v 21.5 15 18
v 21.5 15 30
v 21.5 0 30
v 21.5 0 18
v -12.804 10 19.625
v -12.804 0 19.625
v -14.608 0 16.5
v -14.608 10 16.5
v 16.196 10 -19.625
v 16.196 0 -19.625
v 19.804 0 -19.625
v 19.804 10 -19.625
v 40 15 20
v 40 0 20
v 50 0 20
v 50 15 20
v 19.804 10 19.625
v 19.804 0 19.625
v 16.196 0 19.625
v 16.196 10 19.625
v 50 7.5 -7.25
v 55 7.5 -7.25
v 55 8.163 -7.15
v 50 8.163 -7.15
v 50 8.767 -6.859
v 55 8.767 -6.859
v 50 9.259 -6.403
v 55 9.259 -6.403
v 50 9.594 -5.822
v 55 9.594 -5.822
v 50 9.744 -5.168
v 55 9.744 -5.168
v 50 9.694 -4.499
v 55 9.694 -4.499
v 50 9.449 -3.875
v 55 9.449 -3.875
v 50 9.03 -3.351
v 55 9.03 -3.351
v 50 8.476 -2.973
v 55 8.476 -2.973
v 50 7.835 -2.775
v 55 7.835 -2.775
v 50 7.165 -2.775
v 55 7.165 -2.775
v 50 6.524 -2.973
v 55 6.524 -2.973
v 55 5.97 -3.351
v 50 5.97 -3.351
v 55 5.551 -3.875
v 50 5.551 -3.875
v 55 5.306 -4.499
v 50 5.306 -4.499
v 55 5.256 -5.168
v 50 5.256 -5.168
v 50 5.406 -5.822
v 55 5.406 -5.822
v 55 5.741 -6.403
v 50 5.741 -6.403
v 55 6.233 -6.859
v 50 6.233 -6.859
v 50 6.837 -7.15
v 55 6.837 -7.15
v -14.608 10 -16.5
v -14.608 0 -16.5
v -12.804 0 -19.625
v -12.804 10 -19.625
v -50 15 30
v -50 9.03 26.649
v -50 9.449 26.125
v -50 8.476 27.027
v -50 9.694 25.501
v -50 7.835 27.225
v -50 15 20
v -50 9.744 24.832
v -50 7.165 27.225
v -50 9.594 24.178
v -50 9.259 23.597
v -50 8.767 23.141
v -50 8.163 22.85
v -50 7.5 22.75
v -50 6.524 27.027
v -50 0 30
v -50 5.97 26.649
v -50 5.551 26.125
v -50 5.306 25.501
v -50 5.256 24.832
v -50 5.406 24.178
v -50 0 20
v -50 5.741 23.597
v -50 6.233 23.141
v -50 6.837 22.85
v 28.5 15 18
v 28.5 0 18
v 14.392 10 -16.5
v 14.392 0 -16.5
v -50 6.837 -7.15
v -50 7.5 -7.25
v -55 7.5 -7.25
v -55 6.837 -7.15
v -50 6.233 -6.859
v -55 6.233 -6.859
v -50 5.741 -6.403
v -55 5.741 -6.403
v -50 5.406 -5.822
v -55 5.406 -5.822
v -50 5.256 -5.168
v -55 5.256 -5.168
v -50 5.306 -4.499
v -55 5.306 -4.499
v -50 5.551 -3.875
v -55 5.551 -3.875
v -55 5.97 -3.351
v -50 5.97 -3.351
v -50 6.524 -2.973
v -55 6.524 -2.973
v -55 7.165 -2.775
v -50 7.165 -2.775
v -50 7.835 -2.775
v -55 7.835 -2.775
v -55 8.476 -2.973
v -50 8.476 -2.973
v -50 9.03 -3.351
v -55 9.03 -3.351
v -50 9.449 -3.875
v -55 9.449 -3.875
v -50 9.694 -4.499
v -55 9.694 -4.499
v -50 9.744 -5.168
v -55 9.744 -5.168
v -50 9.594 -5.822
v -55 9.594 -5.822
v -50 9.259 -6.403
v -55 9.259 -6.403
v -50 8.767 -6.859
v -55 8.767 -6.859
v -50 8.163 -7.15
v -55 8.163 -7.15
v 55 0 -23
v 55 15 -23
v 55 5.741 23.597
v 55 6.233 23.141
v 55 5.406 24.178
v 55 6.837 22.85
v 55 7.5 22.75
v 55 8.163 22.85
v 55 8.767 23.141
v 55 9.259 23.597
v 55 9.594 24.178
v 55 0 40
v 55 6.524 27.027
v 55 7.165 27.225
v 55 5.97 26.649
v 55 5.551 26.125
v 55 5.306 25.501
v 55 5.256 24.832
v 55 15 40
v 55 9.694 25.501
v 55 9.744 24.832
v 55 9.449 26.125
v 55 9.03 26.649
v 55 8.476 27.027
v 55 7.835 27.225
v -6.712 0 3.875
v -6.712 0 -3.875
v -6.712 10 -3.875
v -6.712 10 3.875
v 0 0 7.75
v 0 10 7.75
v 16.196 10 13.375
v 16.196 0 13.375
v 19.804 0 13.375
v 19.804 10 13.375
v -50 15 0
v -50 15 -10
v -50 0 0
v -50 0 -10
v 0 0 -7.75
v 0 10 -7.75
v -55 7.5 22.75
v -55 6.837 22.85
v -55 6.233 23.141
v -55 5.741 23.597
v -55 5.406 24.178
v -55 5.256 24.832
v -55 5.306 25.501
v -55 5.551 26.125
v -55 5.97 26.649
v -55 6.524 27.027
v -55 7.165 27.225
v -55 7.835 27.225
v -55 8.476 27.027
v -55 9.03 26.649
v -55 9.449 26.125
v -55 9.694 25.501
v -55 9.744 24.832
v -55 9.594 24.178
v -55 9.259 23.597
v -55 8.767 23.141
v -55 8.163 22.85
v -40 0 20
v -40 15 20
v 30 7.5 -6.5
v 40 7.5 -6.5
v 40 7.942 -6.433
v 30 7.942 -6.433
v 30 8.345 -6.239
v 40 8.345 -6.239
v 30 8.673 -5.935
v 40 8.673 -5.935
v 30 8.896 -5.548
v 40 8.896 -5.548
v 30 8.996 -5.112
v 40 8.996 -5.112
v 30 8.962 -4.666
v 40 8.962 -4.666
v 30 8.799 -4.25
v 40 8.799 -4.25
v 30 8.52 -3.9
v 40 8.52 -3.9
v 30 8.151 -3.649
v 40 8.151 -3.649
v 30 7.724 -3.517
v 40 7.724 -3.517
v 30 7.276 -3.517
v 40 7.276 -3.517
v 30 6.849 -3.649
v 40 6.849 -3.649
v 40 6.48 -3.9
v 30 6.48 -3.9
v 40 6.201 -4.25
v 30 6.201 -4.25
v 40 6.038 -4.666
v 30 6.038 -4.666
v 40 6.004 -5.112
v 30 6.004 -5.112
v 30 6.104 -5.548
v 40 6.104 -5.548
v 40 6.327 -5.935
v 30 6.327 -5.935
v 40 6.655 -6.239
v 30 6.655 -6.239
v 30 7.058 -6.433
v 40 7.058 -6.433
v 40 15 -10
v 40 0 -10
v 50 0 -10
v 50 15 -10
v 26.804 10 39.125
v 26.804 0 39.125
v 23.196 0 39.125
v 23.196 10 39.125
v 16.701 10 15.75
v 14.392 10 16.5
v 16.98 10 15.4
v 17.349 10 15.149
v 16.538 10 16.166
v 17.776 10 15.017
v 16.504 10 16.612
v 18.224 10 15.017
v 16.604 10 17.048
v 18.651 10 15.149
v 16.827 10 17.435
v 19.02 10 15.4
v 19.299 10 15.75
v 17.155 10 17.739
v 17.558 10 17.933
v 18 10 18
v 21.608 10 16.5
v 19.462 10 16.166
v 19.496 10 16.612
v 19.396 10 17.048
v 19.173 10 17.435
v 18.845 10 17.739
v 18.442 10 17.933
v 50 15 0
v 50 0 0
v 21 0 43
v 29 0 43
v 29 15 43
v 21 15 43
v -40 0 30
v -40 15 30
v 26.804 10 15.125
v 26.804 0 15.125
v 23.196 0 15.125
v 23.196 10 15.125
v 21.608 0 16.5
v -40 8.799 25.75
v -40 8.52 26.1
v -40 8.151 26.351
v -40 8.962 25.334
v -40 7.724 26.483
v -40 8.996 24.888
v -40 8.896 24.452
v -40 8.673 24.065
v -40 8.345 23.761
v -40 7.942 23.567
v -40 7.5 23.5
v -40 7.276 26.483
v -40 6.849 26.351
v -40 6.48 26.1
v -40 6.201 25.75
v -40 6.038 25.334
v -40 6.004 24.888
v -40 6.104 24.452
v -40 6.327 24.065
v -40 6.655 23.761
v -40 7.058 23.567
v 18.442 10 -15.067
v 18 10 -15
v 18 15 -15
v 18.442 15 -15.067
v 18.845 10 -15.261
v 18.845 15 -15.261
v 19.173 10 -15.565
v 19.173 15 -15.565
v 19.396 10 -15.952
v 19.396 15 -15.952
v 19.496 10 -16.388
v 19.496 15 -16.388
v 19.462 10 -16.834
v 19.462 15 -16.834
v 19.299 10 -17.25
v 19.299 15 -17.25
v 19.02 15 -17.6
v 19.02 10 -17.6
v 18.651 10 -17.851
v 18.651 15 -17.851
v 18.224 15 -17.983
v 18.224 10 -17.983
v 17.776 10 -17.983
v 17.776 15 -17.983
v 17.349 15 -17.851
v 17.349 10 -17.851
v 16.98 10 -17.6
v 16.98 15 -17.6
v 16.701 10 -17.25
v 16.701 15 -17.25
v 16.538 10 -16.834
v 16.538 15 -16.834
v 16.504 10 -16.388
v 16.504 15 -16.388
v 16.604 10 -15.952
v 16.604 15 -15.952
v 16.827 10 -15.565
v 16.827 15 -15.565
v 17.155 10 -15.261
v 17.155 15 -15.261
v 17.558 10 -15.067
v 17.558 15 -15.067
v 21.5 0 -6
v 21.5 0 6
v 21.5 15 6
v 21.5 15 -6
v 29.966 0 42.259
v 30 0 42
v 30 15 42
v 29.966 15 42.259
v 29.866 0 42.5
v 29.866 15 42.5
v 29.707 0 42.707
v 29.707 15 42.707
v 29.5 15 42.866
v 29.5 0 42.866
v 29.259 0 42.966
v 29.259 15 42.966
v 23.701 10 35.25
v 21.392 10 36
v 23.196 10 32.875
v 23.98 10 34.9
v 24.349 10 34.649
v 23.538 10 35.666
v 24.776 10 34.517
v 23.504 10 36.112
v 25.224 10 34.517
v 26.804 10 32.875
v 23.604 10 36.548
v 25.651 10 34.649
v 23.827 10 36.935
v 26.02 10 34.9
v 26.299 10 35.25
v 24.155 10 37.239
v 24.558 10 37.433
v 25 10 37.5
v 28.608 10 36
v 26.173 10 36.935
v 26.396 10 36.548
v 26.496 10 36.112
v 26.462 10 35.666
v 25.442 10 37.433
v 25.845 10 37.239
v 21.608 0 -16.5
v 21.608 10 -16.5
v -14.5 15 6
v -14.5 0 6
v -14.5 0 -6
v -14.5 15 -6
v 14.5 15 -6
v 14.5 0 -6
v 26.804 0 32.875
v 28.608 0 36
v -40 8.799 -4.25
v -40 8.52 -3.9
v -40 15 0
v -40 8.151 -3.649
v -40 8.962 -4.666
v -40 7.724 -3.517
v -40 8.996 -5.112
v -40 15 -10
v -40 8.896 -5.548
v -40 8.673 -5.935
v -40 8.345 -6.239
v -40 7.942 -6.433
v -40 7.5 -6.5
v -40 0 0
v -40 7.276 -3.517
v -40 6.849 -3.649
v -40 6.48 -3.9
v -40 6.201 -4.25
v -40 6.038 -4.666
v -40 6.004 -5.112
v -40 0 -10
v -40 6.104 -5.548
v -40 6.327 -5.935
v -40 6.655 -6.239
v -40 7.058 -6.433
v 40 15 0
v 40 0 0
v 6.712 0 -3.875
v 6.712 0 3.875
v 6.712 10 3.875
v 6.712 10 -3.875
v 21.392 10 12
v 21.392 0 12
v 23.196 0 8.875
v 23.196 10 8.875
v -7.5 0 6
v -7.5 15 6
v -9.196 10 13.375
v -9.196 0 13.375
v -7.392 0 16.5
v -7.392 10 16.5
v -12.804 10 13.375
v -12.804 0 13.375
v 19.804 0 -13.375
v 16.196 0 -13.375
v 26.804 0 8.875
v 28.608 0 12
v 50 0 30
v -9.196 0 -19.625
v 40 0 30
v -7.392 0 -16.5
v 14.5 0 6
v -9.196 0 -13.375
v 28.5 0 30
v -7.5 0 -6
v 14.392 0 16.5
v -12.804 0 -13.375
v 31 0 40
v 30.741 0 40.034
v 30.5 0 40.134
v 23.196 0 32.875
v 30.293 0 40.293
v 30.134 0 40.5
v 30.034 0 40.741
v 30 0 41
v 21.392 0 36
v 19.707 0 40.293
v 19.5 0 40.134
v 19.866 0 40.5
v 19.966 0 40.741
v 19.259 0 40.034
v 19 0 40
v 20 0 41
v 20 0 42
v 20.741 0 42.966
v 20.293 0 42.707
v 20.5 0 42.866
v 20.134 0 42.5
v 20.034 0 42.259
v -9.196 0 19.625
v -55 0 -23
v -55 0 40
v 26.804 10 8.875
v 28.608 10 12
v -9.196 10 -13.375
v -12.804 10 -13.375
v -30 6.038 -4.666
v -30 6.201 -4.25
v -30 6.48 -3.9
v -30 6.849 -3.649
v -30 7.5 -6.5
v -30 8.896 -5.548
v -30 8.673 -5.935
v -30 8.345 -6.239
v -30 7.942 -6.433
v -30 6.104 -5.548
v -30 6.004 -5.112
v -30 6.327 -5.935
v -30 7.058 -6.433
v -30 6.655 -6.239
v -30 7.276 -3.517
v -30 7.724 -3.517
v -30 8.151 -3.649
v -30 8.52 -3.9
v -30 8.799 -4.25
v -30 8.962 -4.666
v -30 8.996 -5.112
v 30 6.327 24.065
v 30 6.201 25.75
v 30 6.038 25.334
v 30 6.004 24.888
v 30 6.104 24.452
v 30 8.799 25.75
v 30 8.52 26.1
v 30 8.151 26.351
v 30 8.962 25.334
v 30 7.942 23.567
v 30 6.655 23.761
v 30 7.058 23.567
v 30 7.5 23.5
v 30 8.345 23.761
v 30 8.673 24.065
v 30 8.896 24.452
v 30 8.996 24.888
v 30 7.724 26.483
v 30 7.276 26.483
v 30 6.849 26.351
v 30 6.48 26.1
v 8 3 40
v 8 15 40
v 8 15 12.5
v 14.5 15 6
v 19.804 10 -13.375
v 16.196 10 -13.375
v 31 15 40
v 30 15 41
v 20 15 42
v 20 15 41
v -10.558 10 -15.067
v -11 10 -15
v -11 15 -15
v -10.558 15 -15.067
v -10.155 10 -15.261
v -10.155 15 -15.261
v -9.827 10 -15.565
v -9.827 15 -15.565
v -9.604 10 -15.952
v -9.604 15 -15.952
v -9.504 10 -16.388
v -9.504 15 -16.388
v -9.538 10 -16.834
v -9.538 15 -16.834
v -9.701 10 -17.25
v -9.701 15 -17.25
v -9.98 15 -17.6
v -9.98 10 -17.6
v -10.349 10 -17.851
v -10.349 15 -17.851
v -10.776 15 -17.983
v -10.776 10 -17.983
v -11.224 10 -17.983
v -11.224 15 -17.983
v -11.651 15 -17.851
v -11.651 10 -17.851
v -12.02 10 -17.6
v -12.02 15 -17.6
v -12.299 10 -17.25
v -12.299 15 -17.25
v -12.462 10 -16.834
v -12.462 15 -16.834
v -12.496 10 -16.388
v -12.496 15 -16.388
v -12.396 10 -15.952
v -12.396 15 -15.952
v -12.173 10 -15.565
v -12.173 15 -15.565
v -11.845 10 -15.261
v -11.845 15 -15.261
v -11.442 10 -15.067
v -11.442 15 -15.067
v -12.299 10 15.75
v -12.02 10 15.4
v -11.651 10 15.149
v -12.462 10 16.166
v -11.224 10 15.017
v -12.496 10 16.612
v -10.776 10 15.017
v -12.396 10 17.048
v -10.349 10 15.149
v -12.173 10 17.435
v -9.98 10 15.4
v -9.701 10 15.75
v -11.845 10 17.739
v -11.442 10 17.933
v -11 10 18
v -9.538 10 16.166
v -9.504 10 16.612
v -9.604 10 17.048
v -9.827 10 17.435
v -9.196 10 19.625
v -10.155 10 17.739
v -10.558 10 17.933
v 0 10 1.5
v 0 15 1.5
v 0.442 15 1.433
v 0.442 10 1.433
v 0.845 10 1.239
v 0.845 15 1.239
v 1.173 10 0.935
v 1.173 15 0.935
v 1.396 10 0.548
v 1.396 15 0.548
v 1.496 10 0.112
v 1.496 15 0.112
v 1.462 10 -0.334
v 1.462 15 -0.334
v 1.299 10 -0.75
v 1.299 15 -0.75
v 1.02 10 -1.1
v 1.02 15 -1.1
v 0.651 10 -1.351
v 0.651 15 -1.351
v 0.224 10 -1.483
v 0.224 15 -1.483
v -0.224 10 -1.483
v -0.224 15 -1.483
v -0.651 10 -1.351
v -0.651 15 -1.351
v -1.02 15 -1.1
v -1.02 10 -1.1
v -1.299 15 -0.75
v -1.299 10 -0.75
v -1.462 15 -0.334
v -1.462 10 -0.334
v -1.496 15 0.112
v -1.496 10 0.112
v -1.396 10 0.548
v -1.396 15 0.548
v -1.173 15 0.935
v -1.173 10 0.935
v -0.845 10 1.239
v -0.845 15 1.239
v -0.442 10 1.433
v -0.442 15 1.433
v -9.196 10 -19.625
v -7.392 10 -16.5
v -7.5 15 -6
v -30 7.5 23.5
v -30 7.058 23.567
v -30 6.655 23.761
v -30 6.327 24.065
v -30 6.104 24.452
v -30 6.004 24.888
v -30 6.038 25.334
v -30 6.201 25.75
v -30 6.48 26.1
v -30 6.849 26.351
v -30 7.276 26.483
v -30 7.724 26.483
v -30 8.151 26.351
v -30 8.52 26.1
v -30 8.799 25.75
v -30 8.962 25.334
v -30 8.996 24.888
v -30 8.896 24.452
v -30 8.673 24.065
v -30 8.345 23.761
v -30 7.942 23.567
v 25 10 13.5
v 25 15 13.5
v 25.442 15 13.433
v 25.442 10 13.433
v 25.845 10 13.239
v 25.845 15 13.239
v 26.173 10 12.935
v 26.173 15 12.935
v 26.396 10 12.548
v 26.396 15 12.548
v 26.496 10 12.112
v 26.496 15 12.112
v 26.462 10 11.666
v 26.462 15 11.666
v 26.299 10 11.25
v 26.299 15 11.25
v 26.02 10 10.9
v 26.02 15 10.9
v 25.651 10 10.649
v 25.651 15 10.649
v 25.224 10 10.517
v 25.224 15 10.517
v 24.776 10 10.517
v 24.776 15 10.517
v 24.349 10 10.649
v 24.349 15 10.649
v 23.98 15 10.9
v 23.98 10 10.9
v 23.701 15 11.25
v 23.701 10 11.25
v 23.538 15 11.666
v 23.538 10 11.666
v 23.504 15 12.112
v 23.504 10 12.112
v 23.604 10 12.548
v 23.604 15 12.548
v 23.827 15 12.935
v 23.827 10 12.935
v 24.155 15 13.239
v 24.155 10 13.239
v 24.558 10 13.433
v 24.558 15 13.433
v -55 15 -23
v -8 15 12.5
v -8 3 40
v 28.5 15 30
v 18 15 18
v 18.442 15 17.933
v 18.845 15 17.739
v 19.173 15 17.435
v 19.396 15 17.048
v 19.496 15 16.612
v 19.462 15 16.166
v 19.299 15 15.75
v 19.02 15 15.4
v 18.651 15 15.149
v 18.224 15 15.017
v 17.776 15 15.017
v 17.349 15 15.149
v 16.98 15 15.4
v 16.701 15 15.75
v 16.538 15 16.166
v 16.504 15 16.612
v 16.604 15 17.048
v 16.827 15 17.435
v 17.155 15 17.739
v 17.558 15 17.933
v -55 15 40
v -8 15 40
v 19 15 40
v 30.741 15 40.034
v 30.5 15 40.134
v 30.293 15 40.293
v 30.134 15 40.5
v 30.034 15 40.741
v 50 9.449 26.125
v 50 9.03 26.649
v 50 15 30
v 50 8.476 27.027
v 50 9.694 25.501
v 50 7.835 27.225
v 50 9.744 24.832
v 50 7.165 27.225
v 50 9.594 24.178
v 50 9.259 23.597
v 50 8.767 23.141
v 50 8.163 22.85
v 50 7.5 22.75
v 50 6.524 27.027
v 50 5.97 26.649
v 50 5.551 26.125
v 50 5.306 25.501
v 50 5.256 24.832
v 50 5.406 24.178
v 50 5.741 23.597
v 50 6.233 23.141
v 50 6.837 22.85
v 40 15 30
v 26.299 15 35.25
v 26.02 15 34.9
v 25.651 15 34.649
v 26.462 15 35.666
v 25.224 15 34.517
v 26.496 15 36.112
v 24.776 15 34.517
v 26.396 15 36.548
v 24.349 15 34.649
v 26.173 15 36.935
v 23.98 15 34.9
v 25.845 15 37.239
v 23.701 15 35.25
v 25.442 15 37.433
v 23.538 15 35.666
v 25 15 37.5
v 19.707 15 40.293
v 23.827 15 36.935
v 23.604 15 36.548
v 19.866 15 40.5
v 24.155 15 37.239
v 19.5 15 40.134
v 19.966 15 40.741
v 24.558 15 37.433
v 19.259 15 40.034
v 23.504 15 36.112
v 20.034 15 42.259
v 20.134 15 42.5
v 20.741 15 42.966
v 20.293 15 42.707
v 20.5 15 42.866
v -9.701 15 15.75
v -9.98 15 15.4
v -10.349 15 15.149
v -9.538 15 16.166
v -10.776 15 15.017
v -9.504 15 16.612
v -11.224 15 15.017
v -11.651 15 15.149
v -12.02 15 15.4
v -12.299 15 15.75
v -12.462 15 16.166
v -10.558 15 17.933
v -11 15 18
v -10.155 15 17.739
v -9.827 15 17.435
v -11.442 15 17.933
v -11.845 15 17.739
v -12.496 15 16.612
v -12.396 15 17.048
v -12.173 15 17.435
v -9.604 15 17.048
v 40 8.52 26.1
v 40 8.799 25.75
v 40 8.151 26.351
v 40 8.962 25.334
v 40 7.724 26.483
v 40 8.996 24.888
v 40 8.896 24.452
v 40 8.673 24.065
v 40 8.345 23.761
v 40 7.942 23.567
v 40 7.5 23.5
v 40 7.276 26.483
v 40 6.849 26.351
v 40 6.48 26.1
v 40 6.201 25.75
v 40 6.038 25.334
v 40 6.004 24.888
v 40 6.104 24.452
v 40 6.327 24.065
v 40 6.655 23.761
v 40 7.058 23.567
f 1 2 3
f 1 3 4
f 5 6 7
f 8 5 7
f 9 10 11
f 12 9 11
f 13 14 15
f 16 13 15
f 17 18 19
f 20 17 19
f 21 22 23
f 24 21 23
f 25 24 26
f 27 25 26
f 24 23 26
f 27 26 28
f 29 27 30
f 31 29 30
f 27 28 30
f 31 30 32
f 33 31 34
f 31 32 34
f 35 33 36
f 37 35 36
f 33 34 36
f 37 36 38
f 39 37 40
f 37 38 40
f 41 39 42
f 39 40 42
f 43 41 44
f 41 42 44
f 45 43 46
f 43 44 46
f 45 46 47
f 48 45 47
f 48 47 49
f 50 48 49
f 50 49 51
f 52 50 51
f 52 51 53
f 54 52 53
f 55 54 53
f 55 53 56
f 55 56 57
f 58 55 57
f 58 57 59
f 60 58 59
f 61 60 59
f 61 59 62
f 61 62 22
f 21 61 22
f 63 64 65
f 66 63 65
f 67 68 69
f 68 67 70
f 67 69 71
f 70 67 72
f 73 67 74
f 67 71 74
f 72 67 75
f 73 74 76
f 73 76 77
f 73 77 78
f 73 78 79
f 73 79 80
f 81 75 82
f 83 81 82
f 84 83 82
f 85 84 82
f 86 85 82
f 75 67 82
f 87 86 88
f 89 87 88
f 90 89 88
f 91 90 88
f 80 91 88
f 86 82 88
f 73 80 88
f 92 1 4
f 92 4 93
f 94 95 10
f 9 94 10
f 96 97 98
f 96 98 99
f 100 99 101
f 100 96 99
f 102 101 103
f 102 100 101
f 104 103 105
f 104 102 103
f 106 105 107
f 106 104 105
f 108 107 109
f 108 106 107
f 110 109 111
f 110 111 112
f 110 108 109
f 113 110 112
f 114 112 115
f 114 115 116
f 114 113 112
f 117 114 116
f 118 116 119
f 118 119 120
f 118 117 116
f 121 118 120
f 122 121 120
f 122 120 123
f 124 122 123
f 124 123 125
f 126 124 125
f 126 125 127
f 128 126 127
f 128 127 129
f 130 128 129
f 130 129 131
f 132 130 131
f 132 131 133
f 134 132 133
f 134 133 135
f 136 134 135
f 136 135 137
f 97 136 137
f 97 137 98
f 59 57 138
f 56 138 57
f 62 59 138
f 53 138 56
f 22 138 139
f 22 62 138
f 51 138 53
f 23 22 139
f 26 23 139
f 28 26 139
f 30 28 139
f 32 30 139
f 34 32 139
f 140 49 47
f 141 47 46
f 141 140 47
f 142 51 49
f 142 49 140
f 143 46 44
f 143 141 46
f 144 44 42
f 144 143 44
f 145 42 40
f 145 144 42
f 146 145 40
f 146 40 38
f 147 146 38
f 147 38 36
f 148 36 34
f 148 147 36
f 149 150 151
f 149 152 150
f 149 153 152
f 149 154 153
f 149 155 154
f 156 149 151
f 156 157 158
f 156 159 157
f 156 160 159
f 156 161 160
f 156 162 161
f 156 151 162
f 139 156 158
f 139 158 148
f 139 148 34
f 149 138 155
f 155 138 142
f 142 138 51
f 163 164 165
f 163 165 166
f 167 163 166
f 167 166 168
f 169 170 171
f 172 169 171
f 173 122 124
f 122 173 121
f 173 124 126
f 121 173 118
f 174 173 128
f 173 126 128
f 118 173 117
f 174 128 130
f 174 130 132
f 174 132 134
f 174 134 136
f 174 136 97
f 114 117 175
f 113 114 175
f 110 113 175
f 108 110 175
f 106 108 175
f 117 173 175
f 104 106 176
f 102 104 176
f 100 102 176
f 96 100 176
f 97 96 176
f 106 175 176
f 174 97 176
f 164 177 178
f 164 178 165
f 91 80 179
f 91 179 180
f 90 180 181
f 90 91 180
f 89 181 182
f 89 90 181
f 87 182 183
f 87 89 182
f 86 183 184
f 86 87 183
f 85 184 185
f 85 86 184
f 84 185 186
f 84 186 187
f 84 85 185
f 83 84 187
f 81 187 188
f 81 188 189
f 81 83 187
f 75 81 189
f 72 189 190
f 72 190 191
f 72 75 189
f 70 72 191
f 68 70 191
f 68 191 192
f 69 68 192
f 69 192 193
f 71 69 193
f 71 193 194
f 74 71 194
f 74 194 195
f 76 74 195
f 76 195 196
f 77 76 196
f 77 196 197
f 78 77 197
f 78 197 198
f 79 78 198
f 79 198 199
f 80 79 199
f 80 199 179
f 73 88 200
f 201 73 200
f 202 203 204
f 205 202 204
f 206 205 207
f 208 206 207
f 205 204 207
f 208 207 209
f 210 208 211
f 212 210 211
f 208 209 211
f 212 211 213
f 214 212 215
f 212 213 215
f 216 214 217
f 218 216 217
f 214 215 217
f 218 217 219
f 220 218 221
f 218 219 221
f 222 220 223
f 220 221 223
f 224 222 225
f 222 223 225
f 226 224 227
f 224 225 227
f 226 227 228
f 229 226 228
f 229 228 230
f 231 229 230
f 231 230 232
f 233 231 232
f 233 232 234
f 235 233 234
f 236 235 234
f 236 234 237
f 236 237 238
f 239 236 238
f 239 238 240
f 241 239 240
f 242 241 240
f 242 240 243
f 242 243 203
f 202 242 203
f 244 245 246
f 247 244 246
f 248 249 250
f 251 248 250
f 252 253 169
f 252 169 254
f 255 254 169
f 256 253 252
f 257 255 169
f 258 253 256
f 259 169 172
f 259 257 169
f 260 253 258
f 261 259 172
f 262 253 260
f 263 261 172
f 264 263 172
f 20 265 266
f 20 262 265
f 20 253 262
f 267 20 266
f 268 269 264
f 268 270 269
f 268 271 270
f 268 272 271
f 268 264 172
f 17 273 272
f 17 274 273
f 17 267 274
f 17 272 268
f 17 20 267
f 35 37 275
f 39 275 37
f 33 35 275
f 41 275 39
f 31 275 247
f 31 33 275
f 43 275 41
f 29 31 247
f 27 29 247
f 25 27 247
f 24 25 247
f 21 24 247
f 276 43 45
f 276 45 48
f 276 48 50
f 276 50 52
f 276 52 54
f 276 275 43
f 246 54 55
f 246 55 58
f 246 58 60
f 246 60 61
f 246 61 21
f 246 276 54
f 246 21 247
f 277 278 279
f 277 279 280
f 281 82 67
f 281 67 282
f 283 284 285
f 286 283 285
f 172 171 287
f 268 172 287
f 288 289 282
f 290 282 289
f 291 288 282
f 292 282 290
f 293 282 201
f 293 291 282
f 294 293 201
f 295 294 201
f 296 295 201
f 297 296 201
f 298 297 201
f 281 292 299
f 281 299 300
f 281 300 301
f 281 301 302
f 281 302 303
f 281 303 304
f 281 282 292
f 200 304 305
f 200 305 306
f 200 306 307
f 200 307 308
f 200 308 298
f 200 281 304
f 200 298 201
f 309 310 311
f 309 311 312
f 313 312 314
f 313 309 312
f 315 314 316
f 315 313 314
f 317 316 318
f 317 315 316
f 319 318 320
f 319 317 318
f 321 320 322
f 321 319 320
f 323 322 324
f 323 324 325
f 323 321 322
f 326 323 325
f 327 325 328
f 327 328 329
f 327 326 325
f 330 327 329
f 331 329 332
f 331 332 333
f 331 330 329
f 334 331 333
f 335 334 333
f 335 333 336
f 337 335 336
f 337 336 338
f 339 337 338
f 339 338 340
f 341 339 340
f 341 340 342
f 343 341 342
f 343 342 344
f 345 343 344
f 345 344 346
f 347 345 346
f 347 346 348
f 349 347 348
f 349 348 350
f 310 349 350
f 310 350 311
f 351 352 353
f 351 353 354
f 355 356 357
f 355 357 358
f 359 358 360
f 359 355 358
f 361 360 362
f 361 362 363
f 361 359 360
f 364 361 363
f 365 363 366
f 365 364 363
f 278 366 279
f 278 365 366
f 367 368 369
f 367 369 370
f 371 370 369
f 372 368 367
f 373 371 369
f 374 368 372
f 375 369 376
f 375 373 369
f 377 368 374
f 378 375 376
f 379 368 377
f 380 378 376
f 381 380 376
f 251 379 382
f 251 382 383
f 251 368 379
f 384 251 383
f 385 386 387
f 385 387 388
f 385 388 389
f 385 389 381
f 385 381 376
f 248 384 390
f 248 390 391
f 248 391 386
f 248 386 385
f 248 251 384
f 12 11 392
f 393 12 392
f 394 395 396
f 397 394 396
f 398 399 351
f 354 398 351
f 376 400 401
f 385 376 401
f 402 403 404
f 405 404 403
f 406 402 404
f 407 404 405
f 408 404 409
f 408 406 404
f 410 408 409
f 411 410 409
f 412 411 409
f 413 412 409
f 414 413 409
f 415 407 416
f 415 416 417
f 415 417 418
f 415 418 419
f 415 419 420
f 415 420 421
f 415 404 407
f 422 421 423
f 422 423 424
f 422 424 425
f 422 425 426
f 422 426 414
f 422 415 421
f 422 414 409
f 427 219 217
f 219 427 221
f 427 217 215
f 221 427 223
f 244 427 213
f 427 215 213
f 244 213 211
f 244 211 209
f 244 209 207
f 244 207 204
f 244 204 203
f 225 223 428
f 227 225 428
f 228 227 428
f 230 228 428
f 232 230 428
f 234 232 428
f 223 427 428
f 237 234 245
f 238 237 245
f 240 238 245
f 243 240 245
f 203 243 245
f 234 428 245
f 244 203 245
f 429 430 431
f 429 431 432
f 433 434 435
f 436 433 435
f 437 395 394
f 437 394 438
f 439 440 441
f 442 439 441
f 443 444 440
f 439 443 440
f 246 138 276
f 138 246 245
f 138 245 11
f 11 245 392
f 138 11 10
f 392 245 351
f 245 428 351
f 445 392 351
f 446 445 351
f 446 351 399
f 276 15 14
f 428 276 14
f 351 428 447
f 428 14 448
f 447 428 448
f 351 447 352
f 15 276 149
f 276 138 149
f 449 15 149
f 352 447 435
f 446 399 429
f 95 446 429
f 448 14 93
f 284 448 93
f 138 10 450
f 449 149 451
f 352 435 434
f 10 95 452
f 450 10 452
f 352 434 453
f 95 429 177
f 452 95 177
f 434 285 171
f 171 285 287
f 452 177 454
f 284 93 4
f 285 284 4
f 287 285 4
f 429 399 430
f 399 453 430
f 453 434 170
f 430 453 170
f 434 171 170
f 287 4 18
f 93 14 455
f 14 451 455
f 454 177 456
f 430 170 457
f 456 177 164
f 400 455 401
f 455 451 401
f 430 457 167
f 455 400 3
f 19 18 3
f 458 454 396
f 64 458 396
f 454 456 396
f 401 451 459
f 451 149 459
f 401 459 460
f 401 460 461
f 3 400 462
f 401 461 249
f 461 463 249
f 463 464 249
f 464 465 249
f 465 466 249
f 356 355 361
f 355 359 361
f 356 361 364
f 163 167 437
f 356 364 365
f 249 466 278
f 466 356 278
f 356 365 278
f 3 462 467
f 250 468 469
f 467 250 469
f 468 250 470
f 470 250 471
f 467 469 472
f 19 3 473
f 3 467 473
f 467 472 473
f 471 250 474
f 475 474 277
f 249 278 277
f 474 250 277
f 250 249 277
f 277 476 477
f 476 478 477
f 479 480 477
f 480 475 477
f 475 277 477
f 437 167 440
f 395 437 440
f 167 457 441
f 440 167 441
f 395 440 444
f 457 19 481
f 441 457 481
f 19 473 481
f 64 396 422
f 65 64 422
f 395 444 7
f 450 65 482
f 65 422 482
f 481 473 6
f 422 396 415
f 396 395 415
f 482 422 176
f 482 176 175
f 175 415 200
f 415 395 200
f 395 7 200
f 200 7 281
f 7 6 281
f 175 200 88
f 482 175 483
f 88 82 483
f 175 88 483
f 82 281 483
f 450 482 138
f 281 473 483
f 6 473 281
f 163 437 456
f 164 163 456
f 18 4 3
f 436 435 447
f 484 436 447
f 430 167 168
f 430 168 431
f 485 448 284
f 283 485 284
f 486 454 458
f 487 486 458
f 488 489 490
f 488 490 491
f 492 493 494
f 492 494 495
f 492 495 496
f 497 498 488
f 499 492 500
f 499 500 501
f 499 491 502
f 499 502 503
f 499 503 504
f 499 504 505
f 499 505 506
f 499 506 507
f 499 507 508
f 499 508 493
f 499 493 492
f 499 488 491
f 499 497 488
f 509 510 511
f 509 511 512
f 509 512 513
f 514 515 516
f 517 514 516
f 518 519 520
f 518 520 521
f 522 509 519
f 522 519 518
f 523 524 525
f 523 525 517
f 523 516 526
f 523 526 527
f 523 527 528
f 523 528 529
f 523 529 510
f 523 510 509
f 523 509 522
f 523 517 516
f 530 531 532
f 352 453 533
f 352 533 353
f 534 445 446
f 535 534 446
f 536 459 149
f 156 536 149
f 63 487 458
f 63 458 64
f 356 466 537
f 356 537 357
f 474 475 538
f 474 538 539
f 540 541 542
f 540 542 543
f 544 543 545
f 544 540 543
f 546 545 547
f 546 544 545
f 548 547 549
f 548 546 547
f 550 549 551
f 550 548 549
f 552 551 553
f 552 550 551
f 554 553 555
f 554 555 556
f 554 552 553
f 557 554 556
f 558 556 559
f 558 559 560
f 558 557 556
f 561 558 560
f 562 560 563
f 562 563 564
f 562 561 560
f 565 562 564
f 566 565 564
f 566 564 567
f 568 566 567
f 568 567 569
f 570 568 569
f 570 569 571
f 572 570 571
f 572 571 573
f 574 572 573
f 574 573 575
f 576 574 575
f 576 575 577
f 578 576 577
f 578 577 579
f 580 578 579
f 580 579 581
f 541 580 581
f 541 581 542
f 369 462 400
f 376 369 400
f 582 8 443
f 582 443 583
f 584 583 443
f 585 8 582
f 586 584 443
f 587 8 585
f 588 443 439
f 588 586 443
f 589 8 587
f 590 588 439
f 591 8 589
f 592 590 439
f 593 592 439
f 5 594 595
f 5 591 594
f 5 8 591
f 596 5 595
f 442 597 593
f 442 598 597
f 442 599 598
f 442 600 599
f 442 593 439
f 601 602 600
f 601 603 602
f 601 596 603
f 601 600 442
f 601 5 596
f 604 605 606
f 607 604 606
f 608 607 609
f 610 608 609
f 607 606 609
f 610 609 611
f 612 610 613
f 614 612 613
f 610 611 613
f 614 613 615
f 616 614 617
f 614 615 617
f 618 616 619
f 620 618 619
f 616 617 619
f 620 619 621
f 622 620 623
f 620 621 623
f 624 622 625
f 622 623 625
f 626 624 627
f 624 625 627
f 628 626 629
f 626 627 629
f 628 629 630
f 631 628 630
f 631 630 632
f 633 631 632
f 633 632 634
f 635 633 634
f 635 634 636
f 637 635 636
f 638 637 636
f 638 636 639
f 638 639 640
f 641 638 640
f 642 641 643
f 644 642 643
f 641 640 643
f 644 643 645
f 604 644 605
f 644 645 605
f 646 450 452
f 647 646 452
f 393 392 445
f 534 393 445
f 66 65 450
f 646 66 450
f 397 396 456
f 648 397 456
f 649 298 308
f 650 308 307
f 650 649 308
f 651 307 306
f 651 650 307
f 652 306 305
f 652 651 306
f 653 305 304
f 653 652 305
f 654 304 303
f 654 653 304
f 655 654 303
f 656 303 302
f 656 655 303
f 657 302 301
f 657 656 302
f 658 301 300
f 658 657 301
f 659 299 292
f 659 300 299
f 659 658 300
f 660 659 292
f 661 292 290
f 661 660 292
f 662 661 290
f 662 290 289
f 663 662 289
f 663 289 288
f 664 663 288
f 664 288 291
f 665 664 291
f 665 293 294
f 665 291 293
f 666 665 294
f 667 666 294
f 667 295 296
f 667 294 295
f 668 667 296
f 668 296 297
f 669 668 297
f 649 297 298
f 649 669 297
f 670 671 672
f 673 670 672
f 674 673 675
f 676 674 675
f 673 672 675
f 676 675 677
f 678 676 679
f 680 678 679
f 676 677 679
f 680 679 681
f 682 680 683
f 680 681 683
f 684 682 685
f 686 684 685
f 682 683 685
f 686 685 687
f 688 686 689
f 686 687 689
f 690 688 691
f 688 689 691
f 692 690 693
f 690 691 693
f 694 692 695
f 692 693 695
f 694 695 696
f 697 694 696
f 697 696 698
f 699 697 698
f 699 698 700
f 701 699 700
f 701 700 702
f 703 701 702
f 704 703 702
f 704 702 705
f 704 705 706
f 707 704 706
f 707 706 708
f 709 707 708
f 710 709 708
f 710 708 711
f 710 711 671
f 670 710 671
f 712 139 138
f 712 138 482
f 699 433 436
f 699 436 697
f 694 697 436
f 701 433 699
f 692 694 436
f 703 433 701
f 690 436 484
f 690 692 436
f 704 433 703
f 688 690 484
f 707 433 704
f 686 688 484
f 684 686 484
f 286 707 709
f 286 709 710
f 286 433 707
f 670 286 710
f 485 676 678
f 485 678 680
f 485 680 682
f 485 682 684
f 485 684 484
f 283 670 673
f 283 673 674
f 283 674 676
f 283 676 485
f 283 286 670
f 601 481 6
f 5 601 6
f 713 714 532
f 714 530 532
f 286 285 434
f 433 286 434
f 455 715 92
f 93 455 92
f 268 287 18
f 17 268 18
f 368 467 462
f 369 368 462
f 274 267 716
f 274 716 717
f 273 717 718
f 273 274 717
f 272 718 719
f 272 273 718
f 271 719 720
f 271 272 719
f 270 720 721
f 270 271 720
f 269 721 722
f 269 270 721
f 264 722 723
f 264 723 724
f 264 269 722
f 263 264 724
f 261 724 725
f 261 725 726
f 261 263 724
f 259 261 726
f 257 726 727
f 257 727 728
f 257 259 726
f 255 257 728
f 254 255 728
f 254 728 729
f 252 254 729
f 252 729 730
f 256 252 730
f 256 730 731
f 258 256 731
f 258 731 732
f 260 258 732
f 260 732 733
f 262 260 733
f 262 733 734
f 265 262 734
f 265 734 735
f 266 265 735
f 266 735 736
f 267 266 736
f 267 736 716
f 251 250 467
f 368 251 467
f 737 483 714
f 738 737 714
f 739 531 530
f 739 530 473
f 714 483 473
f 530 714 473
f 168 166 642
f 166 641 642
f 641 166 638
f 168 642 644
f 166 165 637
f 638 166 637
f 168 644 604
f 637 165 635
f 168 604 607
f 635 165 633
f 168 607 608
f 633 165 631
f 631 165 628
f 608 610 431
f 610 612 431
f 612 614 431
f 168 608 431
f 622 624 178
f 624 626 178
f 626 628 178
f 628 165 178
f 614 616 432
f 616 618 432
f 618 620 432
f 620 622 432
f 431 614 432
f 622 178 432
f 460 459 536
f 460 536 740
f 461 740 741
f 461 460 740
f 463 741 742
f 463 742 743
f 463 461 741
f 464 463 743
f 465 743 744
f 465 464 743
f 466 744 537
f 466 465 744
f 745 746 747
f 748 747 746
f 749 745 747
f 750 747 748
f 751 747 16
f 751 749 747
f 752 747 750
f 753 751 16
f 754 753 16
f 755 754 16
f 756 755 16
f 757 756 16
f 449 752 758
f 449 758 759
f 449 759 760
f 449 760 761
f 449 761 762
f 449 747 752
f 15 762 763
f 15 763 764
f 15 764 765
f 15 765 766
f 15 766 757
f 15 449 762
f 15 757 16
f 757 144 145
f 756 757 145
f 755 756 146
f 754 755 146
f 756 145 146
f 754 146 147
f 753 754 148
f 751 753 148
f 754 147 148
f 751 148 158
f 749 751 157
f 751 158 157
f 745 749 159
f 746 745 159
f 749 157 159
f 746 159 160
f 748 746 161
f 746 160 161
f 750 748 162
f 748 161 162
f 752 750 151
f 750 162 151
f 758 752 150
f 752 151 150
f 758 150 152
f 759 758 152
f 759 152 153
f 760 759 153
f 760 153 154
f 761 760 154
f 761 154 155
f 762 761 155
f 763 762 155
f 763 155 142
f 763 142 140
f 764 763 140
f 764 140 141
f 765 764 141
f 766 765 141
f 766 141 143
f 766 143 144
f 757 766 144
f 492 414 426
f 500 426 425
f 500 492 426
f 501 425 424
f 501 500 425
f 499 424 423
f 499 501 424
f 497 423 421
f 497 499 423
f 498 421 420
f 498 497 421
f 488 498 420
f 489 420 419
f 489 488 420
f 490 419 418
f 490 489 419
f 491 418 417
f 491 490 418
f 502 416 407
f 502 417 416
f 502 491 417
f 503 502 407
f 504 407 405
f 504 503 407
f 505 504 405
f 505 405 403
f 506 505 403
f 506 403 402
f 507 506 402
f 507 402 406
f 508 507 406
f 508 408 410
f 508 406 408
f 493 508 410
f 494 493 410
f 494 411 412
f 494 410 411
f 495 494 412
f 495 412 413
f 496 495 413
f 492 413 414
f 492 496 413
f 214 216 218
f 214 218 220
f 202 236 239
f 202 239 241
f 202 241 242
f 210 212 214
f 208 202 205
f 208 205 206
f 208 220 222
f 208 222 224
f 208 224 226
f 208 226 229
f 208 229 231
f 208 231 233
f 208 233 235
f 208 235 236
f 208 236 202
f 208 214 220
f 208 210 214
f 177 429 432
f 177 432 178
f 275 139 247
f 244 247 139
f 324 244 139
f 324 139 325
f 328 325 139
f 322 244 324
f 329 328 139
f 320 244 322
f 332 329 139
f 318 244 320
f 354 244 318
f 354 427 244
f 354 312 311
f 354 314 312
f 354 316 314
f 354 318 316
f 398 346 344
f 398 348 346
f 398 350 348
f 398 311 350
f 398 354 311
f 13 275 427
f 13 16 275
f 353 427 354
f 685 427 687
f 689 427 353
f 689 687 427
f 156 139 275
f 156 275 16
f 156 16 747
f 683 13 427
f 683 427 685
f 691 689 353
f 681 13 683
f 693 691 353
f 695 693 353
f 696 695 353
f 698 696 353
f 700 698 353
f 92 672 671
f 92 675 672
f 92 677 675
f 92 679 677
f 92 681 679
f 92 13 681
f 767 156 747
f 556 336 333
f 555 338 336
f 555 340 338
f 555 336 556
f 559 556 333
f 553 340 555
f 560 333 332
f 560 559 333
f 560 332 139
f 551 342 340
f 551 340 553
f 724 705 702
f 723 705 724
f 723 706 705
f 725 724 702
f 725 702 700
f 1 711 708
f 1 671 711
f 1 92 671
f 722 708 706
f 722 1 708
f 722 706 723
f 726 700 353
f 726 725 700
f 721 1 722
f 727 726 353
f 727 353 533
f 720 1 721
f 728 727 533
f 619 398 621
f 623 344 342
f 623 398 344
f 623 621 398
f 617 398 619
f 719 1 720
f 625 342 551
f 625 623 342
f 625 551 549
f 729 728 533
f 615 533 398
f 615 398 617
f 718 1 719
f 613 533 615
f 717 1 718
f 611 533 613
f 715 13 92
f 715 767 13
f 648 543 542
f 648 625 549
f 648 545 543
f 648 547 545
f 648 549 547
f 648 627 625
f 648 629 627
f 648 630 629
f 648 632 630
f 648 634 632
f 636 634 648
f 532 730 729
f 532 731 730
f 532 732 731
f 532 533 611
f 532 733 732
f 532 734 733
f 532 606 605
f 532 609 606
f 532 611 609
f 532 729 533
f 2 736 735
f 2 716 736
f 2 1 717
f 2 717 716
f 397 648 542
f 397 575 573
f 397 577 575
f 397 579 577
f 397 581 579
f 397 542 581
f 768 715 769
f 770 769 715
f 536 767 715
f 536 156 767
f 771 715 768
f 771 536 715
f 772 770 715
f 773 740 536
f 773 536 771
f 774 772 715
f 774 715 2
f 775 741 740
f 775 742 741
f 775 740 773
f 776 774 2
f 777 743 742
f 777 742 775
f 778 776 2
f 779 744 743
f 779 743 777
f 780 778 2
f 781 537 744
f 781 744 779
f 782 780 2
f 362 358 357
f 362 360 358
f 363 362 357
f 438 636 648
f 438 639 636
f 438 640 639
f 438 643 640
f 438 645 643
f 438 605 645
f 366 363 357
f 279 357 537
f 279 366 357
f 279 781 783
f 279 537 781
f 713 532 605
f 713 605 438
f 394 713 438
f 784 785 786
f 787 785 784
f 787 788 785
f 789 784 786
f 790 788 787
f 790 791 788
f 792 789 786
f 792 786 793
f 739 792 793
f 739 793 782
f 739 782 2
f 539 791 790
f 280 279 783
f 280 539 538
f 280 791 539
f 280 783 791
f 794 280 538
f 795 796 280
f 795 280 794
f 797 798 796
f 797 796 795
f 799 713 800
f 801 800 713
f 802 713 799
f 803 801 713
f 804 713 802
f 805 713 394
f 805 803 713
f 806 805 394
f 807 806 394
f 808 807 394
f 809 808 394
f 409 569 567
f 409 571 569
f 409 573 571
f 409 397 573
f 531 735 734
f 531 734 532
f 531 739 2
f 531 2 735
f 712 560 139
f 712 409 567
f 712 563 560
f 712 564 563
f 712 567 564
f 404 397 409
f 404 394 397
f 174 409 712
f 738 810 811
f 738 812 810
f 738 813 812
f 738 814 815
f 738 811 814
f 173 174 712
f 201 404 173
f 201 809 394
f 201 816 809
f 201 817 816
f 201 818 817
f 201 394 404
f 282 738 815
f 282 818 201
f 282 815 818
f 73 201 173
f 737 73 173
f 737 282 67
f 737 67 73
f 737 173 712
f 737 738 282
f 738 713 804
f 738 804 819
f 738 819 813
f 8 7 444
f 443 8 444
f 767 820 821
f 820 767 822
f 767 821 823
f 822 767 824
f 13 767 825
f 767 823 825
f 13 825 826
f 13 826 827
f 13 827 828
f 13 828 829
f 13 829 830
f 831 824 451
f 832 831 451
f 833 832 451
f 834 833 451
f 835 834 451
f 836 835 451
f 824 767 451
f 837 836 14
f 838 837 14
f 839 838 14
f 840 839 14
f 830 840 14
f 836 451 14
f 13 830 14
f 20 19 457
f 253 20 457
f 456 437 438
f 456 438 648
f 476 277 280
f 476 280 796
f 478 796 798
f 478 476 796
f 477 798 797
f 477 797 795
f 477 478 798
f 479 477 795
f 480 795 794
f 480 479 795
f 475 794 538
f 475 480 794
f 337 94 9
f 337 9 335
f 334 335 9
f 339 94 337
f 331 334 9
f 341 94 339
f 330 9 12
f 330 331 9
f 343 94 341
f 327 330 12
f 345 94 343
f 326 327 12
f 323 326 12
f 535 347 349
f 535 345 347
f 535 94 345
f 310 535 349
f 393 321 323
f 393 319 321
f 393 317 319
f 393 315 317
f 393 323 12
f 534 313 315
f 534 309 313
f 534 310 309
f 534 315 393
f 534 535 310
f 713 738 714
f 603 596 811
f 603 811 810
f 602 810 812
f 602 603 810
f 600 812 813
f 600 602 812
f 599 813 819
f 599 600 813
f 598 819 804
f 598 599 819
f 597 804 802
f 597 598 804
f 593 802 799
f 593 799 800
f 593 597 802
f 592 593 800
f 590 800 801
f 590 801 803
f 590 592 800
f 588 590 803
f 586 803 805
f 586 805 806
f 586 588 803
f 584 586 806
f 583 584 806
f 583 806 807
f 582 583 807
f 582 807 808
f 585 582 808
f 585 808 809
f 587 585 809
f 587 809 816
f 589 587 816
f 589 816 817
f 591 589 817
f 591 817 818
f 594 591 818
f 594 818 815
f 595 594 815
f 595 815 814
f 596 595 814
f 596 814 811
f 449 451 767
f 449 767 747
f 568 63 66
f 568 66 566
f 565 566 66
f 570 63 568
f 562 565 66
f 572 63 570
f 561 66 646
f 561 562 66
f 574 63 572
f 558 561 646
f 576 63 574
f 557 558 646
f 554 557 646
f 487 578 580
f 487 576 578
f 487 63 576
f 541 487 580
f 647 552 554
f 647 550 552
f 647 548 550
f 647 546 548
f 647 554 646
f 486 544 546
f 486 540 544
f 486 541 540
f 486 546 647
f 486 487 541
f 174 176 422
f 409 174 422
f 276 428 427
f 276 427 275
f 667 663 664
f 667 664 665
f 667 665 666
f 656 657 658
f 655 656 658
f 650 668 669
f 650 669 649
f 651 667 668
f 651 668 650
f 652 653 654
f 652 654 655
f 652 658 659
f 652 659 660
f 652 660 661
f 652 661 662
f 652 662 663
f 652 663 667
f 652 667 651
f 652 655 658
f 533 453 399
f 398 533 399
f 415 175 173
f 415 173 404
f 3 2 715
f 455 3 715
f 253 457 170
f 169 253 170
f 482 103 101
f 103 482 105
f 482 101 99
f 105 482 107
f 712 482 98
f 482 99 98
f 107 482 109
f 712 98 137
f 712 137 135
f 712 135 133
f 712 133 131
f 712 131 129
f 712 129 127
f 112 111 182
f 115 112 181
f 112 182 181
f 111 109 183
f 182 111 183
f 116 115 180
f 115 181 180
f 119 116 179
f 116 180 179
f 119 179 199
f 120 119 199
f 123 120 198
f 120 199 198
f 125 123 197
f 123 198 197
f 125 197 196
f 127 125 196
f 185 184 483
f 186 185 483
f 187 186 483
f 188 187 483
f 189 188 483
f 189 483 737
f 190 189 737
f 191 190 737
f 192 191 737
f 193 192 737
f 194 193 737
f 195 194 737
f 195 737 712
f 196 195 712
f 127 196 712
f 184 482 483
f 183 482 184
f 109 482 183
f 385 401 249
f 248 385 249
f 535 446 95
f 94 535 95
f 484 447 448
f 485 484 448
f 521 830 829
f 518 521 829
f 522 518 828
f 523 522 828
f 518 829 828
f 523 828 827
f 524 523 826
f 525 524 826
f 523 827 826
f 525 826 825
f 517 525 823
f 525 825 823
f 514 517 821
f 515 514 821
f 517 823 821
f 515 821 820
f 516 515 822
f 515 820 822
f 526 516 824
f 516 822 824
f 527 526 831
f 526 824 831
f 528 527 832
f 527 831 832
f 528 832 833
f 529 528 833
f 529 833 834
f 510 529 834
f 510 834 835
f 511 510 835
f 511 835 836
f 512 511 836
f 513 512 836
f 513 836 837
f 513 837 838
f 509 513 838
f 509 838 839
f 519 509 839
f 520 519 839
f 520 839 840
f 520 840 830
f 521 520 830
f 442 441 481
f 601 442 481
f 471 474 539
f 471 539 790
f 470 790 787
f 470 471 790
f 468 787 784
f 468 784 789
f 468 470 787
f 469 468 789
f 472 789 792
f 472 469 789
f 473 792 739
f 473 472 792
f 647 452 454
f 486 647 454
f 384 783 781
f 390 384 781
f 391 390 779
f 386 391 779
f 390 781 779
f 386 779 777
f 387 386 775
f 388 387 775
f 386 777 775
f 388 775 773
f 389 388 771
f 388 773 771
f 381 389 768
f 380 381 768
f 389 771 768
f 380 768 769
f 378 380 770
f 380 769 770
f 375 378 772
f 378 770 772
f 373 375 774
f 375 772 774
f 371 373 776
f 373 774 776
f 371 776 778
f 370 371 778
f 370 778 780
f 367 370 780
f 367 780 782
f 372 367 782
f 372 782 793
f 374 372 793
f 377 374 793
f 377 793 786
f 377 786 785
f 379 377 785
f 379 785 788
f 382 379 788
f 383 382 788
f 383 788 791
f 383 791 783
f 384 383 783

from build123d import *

# Parameters (mm, degrees)
CROQUIS1_W              = 80
CROQUIS1_H              = 60
CROQUIS1_R              = 1.5
CROQUIS1_W_2            = 7
CROQUIS1_H_2            = 25
CROQUIS1_W_3            = 10
CROQUIS1_H_3            = 20
CROQUIS1_H_4            = 10
CROQUIS1_W_4            = 5
CROQUIS1_H_5            = 6.5
SALIENTE_EXTRUIR1_DEPTH = 15
CORTAR_EXTRUIR1_DEPTH   = 10
CROQUIS3_R              = 1.5
CORTAR_EXTRUIR2_DEPTH   = 25
CORTAR_EXTRUIR3_START   = -25
CROQUIS6_R              = 1.5
CORTAR_EXTRUIR3_DEPTH   = 25
CROQUIS8_W              = 15
CROQUIS8_H              = 17.838651154
CROQUIS8_R              = 1.5
SALIENTE_EXTRUIR2_DEPTH = 5
CORTAR_EXTRUIR4_START   = -55
CORTAR_EXTRUIR4_DEPTH   = 8
CROQUIS10_R             = 1.5
CROQUIS10_W             = 7
CROQUIS10_H             = 12
CORTAR_EXTRUIR5_DEPTH   = 16
CROQUIS12_W             = 110
CROQUIS12_H             = 15
SALIENTE_EXTRUIR3_DEPTH = 3
CORTAR_EXTRUIR6_DEPTH   = 10
SALIENTE_EXTRUIR4_DEPTH = 15
CROQUIS15_R             = 2.25
CORTAR_EXTRUIR7_DEPTH   = 10
CORTAR_EXTRUIR8_START   = -10
CROQUIS16_R             = 2.25
CORTAR_EXTRUIR8_DEPTH   = 10


with BuildPart() as part:
    # Croquis1 → Saliente-Extruir1 (new body)
    # profile 1 of 13: a face of its own
    with BuildSketch(Plane(origin=(0, 0, 0), x_dir=(1, 0, 0), z_dir=(0, 1, 0))):
        with Locations((0, -10)):
            Rectangle(CROQUIS1_W, CROQUIS1_H)
        with Locations(Location((18, -16.5, 0), (0, 0, 270))):
            Circle(CROQUIS1_R, mode=Mode.SUBTRACT)
        with Locations(Location((-11, -16.5, 0), (0, 0, 270))):
            Circle(CROQUIS1_R, mode=Mode.SUBTRACT)
        with Locations(Location((18, 16.5, 0), (0, 0, 270))):
            Circle(CROQUIS1_R, mode=Mode.SUBTRACT)
        with Locations(Location((-11, 16.5, 0), (0, 0, 270))):
            Circle(CROQUIS1_R, mode=Mode.SUBTRACT)
        with Locations((18, 0)):
            Rectangle(CROQUIS1_W_2, CROQUIS1_H_2, mode=Mode.SUBTRACT)
        Polygon((6.711696879, 3.875), (0, 7.75), (-6.711696879, 3.875), (-6.711696879, -3.875), (0, -7.75), (6.711696879, -3.875), align=None, mode=Mode.SUBTRACT)
        with Locations((-11, 0)):
            Rectangle(CROQUIS1_W_2, CROQUIS1_H_2, mode=Mode.SUBTRACT)
    # profile 2 of 13: a face of its own
    with BuildSketch(Plane(origin=(0, 0, 0), x_dir=(1, 0, 0), z_dir=(0, 1, 0))):
        with Locations((-45, -10)):
            Rectangle(CROQUIS1_W_3, CROQUIS1_H_3)
    # profile 3 of 13: a face of its own
    with BuildSketch(Plane(origin=(0, 0, 0), x_dir=(1, 0, 0), z_dir=(0, 1, 0))):
        with Locations((-45, -35)):
            Rectangle(CROQUIS1_W_3, CROQUIS1_H_4)
    # profile 4 of 13: a face of its own
    with BuildSketch(Plane(origin=(0, 0, 0), x_dir=(1, 0, 0), z_dir=(0, 1, 0))):
        with Locations((-52.5, -10)):
            Rectangle(CROQUIS1_W_4, CROQUIS1_H)
    # profile 5 of 13: a face of its own
    with BuildSketch(Plane(origin=(0, 0, 0), x_dir=(1, 0, 0), z_dir=(0, 1, 0))):
        with Locations((-45, 15)):
            Rectangle(CROQUIS1_W_3, CROQUIS1_H_4)
    # profile 6 of 13: a face of its own
    with BuildSketch(Plane(origin=(0, 0, 0), x_dir=(1, 0, 0), z_dir=(0, 1, 0))):
        with Locations((45, 15)):
            Rectangle(CROQUIS1_W_3, CROQUIS1_H_4)
    # profile 7 of 13: a face of its own
    with BuildSketch(Plane(origin=(0, 0, 0), x_dir=(1, 0, 0), z_dir=(0, 1, 0))):
        with Locations((52.5, -10)):
            Rectangle(CROQUIS1_W_4, CROQUIS1_H)
    # profile 8 of 13: a face of its own
    with BuildSketch(Plane(origin=(0, 0, 0), x_dir=(1, 0, 0), z_dir=(0, 1, 0))):
        with Locations((45, -10)):
            Rectangle(CROQUIS1_W_3, CROQUIS1_H_3)
    # profile 9 of 13: a face of its own
    with BuildSketch(Plane(origin=(0, 0, 0), x_dir=(1, 0, 0), z_dir=(0, 1, 0))):
        with Locations((45, -35)):
            Rectangle(CROQUIS1_W_3, CROQUIS1_H_4)
    # profile 10 of 13: a face of its own
    with BuildSketch(Plane(origin=(0, 0, 0), x_dir=(1, 0, 0), z_dir=(0, 1, 0))):
        with Locations((-11, 9.25)):
            Rectangle(CROQUIS1_W_2, CROQUIS1_H_5)
    # profile 11 of 13: a face of its own
    with BuildSketch(Plane(origin=(0, 0, 0), x_dir=(1, 0, 0), z_dir=(0, 1, 0))):
        with Locations((-11, -9.25)):
            Rectangle(CROQUIS1_W_2, CROQUIS1_H_5)
    # profile 12 of 13: a face of its own
    with BuildSketch(Plane(origin=(0, 0, 0), x_dir=(1, 0, 0), z_dir=(0, 1, 0))):
        with Locations((18, 9.25)):
            Rectangle(CROQUIS1_W_2, CROQUIS1_H_5)
    # profile 13 of 13: a face of its own
    with BuildSketch(Plane(origin=(0, 0, 0), x_dir=(1, 0, 0), z_dir=(0, 1, 0))):
        with Locations((18, -9.25)):
            Rectangle(CROQUIS1_W_2, CROQUIS1_H_5)
    extrude(amount=SALIENTE_EXTRUIR1_DEPTH)

    # Croquis2 → Cortar-Extruir1 (cut)
    with BuildSketch(Plane.XZ):
        Polygon((-7.391560818, 16.5), (-9.195780409, 19.625), (-12.804219591, 19.625), (-14.608439182, 16.5), (-12.804219591, 13.375), (-9.195780409, 13.375), align=None)
        Polygon((21.608439182, 16.5), (19.804219591, 19.625), (16.195780409, 19.625), (14.391560818, 16.5), (16.195780409, 13.375), (19.804219591, 13.375), align=None)
        Polygon((-7.391560818, -16.5), (-9.195780409, -13.375), (-12.804219591, -13.375), (-14.608439182, -16.5), (-12.804219591, -19.625), (-9.195780409, -19.625), align=None)
        Polygon((21.608439182, -16.5), (19.804219591, -13.375), (16.195780409, -13.375), (14.391560818, -16.5), (16.195780409, -19.625), (19.804219591, -19.625), align=None)
    extrude(amount=-CORTAR_EXTRUIR1_DEPTH, mode=Mode.SUBTRACT)

    # Croquis3 → Cortar-Extruir2 (cut)
    with BuildSketch(Plane(origin=(55, 0, 0), x_dir=(0, 0, -1), z_dir=(1, 0, 0))):
        with Locations((-25, 7.5)):
            Circle(CROQUIS3_R)
        with Locations((5, 7.5)):
            Circle(CROQUIS3_R)
    extrude(amount=-CORTAR_EXTRUIR2_DEPTH, mode=Mode.SUBTRACT)

    # Croquis6 → Cortar-Extruir3 (cut)
    with BuildSketch(Plane.ZY.offset(55).offset(CORTAR_EXTRUIR3_START)):
        with Locations(Location((-5, 7.5, 0), (0, 0, 180))):
            Circle(CROQUIS6_R)
        with Locations(Location((25, 7.5, 0), (0, 0, 180))):
            Circle(CROQUIS6_R)
    extrude(amount=CORTAR_EXTRUIR3_DEPTH, mode=Mode.SUBTRACT)

    # Croquis8 → Saliente-Extruir2 (add)
    with BuildSketch(Plane(origin=(0, 15, 0), x_dir=(1, 0, 0), z_dir=(0, 1, 0))):
        Rectangle(CROQUIS8_W, CROQUIS8_H)
        with Locations(Location((0, 0, 0), (0, 0, 270))):
            Circle(CROQUIS8_R, mode=Mode.SUBTRACT)
    extrude(amount=-SALIENTE_EXTRUIR2_DEPTH)

    # Croquis9 → Cortar-Extruir4 (cut, symmetric)
    with BuildSketch(Plane(origin=(55, 0, 0), x_dir=(0, 0, -1), z_dir=(1, 0, 0)).offset(CORTAR_EXTRUIR4_START)):
        Polygon((-40, 3), (-12.5, 15), (-40, 15), align=None)
    extrude(amount=CORTAR_EXTRUIR4_DEPTH, both=True, mode=Mode.SUBTRACT)

    # Croquis10 → Cortar-Extruir5 (cut)
    with BuildSketch(Plane(origin=(0, 15, 0), x_dir=(1, 0, 0), z_dir=(0, 1, 0))):
        with Locations(Location((25, -12, 0), (0, 0, 270))):
            Circle(CROQUIS10_R)
        with Locations(Location((25, -36, 0), (0, 0, 270))):
            Circle(CROQUIS10_R)
        with Locations((25, -24)):
            Rectangle(CROQUIS10_W, CROQUIS10_H)
    extrude(amount=-CORTAR_EXTRUIR5_DEPTH, mode=Mode.SUBTRACT)

    # Croquis12 → Saliente-Extruir3 (add)
    with BuildSketch(Plane(origin=(0, 0, -20), x_dir=(-1, 0, 0), z_dir=(0, 0, -1))):
        with Locations((0, 7.5)):
            Rectangle(CROQUIS12_W, CROQUIS12_H)
    extrude(amount=SALIENTE_EXTRUIR3_DEPTH)

    # Croquis13 → Cortar-Extruir6 (cut)
    with BuildSketch(Plane.XZ):
        Polygon((28.608439182, 12), (26.804219591, 15.125), (23.195780409, 15.125), (21.391560818, 12), (23.195780409, 8.875), (26.804219591, 8.875), align=None)
        Polygon((28.608439182, 36), (26.804219591, 39.125), (23.195780409, 39.125), (21.391560818, 36), (23.195780409, 32.875), (26.804219591, 32.875), align=None)
    extrude(amount=-CORTAR_EXTRUIR6_DEPTH, mode=Mode.SUBTRACT)

    # Croquis14 → Saliente-Extruir4 (add)
    with BuildSketch(Plane.XZ):
        with BuildLine():
            Line((30, 41), (30, 42))
            ThreePointArc((30, 42), (29.707106781, 42.707106781), (29, 43))
            Line((29, 43), (21, 43))
            ThreePointArc((21, 43), (20.292893219, 42.707106781), (20, 42))
            Line((20, 42), (20, 41))
            ThreePointArc((20, 41), (19.707106781, 40.292893219), (19, 40))
            Line((19, 40), (31, 40))
            ThreePointArc((31, 40), (30.292893219, 40.292893219), (30, 41))
        make_face()
    extrude(amount=-SALIENTE_EXTRUIR4_DEPTH)

    # Croquis15 → Cortar-Extruir7 (cut)
    with BuildSketch(Plane(origin=(55, 0, 0), x_dir=(0, 0, -1), z_dir=(1, 0, 0))):
        with Locations((-25, 7.5)):
            Circle(CROQUIS15_R)
        with Locations((5, 7.5)):
            Circle(CROQUIS15_R)
    extrude(amount=-CORTAR_EXTRUIR7_DEPTH, mode=Mode.SUBTRACT)

    # Croquis16 → Cortar-Extruir8 (cut)
    with BuildSketch(Plane.ZY.offset(55).offset(CORTAR_EXTRUIR8_START)):
        with Locations(Location((-5, 7.5, 0), (0, 0, 180))):
            Circle(CROQUIS16_R)
        with Locations(Location((25, 7.5, 0), (0, 0, 180))):
            Circle(CROQUIS16_R)
    extrude(amount=CORTAR_EXTRUIR8_DEPTH, mode=Mode.SUBTRACT)


solid = part.part
